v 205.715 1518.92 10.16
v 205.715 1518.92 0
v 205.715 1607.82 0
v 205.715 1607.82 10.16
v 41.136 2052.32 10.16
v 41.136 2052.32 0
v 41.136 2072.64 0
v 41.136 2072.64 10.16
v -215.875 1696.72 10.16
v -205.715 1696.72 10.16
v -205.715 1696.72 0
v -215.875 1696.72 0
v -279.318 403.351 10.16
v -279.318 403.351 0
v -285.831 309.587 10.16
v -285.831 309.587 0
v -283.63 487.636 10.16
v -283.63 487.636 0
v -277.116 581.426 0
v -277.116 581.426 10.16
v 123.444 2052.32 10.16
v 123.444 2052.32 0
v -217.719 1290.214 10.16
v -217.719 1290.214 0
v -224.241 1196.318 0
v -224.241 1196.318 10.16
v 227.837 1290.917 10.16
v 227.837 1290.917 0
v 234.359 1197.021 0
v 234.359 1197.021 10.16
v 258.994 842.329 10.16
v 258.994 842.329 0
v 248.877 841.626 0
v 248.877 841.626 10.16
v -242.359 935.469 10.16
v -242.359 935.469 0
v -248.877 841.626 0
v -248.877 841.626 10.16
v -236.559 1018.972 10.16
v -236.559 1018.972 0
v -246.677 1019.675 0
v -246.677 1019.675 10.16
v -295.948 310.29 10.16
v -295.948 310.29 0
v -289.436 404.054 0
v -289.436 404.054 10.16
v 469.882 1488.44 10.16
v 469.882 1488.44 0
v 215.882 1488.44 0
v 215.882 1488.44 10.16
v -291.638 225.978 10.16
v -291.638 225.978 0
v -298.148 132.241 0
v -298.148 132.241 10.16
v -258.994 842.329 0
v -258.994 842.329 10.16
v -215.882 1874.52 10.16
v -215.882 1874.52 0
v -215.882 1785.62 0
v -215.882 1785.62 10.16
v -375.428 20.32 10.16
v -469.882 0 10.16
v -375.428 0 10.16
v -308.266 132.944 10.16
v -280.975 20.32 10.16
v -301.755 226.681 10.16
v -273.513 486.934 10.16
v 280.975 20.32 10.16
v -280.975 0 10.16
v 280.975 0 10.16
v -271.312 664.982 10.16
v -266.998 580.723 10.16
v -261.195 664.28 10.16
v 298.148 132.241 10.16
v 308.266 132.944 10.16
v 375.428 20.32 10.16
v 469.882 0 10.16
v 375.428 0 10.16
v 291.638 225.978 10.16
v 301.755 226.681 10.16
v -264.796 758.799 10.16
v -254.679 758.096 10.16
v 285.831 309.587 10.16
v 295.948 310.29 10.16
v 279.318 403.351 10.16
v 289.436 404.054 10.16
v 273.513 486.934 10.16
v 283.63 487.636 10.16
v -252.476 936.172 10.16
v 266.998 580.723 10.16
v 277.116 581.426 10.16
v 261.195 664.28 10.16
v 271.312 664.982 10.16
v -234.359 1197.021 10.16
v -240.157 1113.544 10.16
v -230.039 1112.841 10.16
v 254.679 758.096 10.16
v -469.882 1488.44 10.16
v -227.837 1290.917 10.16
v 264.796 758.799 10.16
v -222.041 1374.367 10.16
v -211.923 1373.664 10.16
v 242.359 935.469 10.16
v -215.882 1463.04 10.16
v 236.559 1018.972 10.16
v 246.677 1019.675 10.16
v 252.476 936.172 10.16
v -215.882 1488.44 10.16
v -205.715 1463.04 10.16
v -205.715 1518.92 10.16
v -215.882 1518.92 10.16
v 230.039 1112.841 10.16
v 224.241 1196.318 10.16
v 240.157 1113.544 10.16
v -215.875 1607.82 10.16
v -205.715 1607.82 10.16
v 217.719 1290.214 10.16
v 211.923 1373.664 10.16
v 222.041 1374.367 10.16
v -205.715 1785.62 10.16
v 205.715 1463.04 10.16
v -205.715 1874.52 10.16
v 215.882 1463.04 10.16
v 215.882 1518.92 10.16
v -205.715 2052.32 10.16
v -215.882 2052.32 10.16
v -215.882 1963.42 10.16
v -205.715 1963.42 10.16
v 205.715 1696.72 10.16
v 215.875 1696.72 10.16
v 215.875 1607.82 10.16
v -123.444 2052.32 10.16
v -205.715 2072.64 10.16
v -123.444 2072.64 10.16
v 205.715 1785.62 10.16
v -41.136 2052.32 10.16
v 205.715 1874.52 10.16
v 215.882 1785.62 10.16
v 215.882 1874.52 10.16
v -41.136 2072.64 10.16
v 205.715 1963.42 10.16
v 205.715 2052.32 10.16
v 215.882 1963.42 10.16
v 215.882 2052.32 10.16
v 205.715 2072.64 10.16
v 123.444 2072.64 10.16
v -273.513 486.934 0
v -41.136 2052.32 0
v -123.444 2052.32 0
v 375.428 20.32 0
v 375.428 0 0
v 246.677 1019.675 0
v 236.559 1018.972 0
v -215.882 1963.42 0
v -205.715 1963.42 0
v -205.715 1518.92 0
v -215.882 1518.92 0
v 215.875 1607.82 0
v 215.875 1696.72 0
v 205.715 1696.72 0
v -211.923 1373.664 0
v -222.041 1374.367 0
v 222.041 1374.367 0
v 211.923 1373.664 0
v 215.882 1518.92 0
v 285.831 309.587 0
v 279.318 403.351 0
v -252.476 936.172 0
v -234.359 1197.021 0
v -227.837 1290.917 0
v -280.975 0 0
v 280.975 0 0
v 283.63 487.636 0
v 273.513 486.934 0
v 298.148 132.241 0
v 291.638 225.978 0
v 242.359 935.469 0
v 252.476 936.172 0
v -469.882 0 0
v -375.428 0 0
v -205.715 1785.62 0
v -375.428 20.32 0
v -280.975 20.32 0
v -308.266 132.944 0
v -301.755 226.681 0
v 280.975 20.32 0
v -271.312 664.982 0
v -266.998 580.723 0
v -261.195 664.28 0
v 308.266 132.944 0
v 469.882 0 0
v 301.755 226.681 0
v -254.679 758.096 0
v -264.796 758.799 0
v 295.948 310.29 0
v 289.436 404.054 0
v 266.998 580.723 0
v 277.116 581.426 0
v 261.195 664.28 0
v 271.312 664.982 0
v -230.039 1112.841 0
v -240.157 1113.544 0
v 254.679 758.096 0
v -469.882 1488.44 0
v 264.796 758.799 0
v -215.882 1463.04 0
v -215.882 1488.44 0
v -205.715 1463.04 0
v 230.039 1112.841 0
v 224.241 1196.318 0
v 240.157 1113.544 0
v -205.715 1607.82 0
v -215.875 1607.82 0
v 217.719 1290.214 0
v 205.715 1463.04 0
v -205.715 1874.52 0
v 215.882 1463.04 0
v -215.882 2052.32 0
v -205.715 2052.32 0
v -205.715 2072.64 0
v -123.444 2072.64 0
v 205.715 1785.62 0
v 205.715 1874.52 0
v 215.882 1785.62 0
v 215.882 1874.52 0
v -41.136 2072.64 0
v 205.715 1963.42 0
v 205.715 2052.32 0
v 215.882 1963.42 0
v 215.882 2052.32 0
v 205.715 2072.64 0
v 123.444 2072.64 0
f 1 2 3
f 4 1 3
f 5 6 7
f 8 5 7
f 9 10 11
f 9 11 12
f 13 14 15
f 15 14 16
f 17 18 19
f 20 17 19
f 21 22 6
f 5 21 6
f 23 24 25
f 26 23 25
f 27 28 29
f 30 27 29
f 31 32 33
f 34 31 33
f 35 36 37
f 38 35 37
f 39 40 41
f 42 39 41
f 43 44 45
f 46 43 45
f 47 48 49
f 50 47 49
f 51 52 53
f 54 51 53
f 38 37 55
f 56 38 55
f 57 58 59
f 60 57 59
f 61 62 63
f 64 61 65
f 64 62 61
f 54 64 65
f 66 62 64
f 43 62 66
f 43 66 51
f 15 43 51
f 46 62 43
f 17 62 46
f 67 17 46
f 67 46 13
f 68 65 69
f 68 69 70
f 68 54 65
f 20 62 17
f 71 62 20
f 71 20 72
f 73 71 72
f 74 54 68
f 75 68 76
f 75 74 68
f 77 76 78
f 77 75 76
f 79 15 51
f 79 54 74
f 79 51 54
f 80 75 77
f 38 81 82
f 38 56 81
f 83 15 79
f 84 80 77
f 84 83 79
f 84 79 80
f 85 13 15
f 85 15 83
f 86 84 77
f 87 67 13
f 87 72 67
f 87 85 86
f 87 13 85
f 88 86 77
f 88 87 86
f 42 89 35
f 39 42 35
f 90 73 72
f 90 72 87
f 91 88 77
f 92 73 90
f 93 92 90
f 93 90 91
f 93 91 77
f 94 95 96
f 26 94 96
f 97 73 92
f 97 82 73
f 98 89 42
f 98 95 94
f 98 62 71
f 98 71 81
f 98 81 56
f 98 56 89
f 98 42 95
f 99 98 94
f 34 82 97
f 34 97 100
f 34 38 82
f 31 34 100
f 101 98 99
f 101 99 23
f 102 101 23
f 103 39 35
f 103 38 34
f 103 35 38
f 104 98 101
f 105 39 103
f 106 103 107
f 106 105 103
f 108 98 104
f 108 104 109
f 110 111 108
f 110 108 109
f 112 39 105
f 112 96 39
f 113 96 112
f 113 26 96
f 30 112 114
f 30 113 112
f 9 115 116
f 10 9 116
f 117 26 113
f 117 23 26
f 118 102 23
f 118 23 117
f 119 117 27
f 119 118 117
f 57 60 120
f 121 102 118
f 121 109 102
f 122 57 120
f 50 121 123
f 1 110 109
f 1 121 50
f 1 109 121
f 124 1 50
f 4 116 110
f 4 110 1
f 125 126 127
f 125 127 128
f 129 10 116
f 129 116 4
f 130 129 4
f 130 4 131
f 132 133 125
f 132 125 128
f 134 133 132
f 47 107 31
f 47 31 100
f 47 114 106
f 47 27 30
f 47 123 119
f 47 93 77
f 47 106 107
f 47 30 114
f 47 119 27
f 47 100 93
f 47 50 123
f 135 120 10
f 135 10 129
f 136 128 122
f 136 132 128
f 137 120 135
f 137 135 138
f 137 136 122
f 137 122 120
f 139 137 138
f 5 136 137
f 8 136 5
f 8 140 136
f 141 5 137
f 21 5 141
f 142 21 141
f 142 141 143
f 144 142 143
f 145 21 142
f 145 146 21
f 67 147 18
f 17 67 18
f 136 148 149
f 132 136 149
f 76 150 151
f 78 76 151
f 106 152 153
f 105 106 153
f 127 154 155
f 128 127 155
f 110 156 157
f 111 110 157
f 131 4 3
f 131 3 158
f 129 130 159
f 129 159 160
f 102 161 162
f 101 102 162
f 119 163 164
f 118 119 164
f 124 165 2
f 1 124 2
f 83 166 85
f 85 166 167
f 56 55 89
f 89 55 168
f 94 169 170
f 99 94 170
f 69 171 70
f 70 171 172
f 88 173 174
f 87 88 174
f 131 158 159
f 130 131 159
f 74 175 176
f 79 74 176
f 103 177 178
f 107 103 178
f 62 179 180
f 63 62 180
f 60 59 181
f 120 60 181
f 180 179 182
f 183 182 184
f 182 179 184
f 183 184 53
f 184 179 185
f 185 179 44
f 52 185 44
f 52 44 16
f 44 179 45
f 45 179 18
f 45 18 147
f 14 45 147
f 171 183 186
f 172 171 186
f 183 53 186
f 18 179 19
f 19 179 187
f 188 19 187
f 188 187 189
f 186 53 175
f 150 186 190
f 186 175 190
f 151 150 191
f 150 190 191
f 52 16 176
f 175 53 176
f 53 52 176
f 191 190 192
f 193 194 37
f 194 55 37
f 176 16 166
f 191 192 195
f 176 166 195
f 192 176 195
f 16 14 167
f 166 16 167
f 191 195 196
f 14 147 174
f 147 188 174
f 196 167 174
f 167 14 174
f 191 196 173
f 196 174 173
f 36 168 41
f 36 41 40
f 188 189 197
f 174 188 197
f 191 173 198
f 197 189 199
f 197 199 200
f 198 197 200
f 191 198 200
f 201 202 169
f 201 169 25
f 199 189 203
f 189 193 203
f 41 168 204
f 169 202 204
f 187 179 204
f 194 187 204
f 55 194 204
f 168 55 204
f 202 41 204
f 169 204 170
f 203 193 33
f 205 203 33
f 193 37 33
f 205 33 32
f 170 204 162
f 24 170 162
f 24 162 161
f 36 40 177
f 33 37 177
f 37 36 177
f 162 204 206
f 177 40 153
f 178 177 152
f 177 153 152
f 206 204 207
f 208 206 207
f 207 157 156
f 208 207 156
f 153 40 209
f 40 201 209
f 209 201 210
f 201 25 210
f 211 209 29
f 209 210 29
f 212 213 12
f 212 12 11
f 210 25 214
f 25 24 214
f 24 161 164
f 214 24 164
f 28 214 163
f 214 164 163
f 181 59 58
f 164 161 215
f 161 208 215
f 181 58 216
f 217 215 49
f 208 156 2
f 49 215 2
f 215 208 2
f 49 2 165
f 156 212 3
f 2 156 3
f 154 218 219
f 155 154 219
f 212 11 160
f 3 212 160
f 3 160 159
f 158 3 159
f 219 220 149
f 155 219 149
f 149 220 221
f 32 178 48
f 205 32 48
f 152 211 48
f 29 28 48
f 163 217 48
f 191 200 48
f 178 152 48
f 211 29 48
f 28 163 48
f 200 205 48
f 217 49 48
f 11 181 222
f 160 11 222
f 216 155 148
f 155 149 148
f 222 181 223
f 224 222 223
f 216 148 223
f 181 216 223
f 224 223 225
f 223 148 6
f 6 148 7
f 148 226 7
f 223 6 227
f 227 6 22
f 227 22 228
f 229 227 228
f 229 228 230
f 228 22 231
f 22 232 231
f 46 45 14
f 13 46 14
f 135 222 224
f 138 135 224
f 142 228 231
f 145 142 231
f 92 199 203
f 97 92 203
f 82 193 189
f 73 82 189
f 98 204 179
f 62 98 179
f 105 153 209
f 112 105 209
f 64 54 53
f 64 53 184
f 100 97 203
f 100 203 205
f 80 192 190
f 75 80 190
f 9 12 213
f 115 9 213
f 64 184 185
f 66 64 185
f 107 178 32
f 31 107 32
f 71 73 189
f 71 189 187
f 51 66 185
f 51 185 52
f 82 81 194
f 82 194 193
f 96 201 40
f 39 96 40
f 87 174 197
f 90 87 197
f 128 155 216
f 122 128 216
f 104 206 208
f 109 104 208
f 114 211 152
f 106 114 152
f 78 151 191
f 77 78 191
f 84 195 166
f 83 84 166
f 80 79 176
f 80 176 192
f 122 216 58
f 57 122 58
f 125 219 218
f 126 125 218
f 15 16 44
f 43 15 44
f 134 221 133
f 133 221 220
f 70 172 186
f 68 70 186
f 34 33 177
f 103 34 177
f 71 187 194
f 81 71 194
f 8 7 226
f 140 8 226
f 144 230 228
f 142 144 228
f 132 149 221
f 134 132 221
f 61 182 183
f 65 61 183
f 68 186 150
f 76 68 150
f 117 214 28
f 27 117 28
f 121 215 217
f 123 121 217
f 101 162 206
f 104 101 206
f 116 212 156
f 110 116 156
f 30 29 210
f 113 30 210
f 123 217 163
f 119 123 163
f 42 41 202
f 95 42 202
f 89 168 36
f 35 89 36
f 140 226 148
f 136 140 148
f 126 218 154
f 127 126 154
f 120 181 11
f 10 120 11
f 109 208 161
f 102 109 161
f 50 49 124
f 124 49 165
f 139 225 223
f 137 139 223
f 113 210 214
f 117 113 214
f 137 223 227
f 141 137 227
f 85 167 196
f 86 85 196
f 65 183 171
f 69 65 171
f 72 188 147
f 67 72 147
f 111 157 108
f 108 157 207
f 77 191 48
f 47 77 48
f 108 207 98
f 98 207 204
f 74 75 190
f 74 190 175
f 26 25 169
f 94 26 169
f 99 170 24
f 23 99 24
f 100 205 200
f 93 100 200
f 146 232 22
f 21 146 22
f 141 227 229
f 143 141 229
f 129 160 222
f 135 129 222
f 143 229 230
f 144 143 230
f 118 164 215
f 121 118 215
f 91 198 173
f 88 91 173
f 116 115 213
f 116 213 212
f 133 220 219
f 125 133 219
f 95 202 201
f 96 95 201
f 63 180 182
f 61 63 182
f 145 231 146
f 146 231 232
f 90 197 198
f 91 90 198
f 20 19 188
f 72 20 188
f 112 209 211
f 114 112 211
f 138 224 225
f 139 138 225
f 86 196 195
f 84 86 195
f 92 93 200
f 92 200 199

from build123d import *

# Parameters (mm, degrees)
BOSS_EXTRUDE1_DEPTH = 10.16
SKETCH5_W           = 63.5
SKETCH5_H           = 20.32
CUT_EXTRUDE1_DEPTH  = 2126.25967614


with BuildPart() as part:
    # Sketch1 → Boss-Extrude1 (new body)
    with BuildSketch(Plane.XY):
        Polygon((-123.444, 2072.64), (-205.715298803, 2072.64), (-205.715298803, 2052.32), (-215.881789204, 2052.32), (-215.881789204, 1963.42), (-205.715298803, 1963.42), (-205.715298803, 1874.52), (-215.881789204, 1874.52), (-215.881789204, 1785.62), (-205.715298803, 1785.62), (-205.715298803, 1696.72), (-215.875298803, 1696.72), (-215.875298803, 1607.82), (-205.715298803, 1607.82), (-205.715298803, 1518.92), (-215.881789204, 1518.92), (-215.881789204, 1488.440000035), (-469.881789204, 1488.440000035), (-469.881789204, 0), (-375.428294602, 0), (-375.428294602, 20.32), (-280.9748, 20.32), (-280.9748, 0), (280.9748, 0), (280.9748, 20.32), (375.428294602, 20.32), (375.428294602, 0), (469.881789204, 0), (469.881789204, 1488.440000035), (215.881789204, 1488.440000035), (215.881789204, 1518.92), (205.715298803, 1518.92), (205.715298803, 1607.82), (215.875298803, 1607.82), (215.875298803, 1696.72), (205.715298803, 1696.72), (205.715298803, 1785.62), (215.881789204, 1785.62), (215.881789204, 1874.52), (205.715298803, 1874.52), (205.715298803, 1963.42), (215.881789204, 1963.42), (215.881789204, 2052.32), (205.715298803, 2052.32), (205.715298803, 2072.64), (123.444, 2072.64), (123.444, 2052.32), (41.135649402, 2052.32), (41.135649402, 2072.64), (-41.135649402, 2072.64), (-41.135649402, 2052.32), (-123.444, 2052.32), align=None)
        Polygon((215.881789204, 1463.040000035), (222.040744894, 1374.366931824), (211.92306481, 1373.664189215), (205.715298803, 1463.040000035), align=None, mode=Mode.SUBTRACT)
        Polygon((-205.715298803, 1463.040000035), (-211.92306481, 1373.664189215), (-222.040744894, 1374.366931824), (-215.881789204, 1463.040000035), align=None, mode=Mode.SUBTRACT)
        Polygon((240.15668194, 1113.544188093), (246.676567651, 1019.674658983), (236.558887567, 1018.971916374), (230.039001856, 1112.841445484), align=None, mode=Mode.SUBTRACT)
        Polygon((-308.266124544, 132.94397688), (-301.755453134, 226.680843836), (-291.63777305, 225.978101227), (-298.14844446, 132.241234271), align=None, mode=Mode.SUBTRACT)
        Polygon((-289.435698895, 404.053512688), (-279.318018811, 403.350770078), (-285.830533081, 309.587370692), (-295.948213166, 310.290113301), align=None, mode=Mode.SUBTRACT)
        Polygon((-283.630301787, 487.636249721), (-277.115944656, 581.426181539), (-266.998264572, 580.72343893), (-273.512621703, 486.933507112), align=None, mode=Mode.SUBTRACT)
        Polygon((-264.796190418, 758.798850391), (-254.678510334, 758.096107781), (-261.194710324, 664.279643533), (-271.312390408, 664.982386142), align=None, mode=Mode.SUBTRACT)
        Polygon((-252.476436179, 936.171519242), (-242.358756095, 935.468776633), (-248.876798945, 841.625779953), (-258.99447903, 842.328522563), align=None, mode=Mode.SUBTRACT)
        Polygon((301.755453134, 226.680843836), (308.266124544, 132.94397688), (298.14844446, 132.241234271), (291.63777305, 225.978101227), align=None, mode=Mode.SUBTRACT)
        Polygon((279.318018811, 403.350770078), (289.435698895, 404.053512688), (295.948213166, 310.290113301), (285.830533081, 309.587370692), align=None, mode=Mode.SUBTRACT)
        Polygon((277.115944656, 581.426181539), (283.630301787, 487.636249721), (273.512621703, 486.933507112), (266.998264572, 580.72343893), align=None, mode=Mode.SUBTRACT)
        Polygon((254.678510334, 758.096107781), (264.796190418, 758.798850391), (271.312390408, 664.982386142), (261.194710324, 664.279643533), align=None, mode=Mode.SUBTRACT)
        Polygon((242.358756095, 935.468776633), (252.476436179, 936.171519242), (258.99447903, 842.328522563), (248.876798945, 841.625779953), align=None, mode=Mode.SUBTRACT)
        Polygon((-240.15668194, 1113.544188093), (-230.039001856, 1112.841445484), (-236.558887567, 1018.971916374), (-246.676567651, 1019.674658983), align=None, mode=Mode.SUBTRACT)
        Polygon((-227.836927701, 1290.916856945), (-217.719247617, 1290.214114336), (-224.240976188, 1196.318052795), (-234.358656272, 1197.020795404), align=None, mode=Mode.SUBTRACT)
        Polygon((217.719247617, 1290.214114336), (227.836927701, 1290.916856945), (234.358656272, 1197.020795404), (224.240976188, 1196.318052795), align=None, mode=Mode.SUBTRACT)
    extrude(amount=BOSS_EXTRUDE1_DEPTH)

    # Sketch5 → Cut-Extrude1 (cut, through all)
    with BuildSketch(Plane.XY.offset(10.16)):
        with Locations((-501.631789204, 10.16)):
            Rectangle(SKETCH5_W, SKETCH5_H)
        with Locations((501.631789204, 10.16)):
            Rectangle(SKETCH5_W, SKETCH5_H)
    extrude(amount=-CUT_EXTRUDE1_DEPTH, mode=Mode.SUBTRACT)


solid = part.part
